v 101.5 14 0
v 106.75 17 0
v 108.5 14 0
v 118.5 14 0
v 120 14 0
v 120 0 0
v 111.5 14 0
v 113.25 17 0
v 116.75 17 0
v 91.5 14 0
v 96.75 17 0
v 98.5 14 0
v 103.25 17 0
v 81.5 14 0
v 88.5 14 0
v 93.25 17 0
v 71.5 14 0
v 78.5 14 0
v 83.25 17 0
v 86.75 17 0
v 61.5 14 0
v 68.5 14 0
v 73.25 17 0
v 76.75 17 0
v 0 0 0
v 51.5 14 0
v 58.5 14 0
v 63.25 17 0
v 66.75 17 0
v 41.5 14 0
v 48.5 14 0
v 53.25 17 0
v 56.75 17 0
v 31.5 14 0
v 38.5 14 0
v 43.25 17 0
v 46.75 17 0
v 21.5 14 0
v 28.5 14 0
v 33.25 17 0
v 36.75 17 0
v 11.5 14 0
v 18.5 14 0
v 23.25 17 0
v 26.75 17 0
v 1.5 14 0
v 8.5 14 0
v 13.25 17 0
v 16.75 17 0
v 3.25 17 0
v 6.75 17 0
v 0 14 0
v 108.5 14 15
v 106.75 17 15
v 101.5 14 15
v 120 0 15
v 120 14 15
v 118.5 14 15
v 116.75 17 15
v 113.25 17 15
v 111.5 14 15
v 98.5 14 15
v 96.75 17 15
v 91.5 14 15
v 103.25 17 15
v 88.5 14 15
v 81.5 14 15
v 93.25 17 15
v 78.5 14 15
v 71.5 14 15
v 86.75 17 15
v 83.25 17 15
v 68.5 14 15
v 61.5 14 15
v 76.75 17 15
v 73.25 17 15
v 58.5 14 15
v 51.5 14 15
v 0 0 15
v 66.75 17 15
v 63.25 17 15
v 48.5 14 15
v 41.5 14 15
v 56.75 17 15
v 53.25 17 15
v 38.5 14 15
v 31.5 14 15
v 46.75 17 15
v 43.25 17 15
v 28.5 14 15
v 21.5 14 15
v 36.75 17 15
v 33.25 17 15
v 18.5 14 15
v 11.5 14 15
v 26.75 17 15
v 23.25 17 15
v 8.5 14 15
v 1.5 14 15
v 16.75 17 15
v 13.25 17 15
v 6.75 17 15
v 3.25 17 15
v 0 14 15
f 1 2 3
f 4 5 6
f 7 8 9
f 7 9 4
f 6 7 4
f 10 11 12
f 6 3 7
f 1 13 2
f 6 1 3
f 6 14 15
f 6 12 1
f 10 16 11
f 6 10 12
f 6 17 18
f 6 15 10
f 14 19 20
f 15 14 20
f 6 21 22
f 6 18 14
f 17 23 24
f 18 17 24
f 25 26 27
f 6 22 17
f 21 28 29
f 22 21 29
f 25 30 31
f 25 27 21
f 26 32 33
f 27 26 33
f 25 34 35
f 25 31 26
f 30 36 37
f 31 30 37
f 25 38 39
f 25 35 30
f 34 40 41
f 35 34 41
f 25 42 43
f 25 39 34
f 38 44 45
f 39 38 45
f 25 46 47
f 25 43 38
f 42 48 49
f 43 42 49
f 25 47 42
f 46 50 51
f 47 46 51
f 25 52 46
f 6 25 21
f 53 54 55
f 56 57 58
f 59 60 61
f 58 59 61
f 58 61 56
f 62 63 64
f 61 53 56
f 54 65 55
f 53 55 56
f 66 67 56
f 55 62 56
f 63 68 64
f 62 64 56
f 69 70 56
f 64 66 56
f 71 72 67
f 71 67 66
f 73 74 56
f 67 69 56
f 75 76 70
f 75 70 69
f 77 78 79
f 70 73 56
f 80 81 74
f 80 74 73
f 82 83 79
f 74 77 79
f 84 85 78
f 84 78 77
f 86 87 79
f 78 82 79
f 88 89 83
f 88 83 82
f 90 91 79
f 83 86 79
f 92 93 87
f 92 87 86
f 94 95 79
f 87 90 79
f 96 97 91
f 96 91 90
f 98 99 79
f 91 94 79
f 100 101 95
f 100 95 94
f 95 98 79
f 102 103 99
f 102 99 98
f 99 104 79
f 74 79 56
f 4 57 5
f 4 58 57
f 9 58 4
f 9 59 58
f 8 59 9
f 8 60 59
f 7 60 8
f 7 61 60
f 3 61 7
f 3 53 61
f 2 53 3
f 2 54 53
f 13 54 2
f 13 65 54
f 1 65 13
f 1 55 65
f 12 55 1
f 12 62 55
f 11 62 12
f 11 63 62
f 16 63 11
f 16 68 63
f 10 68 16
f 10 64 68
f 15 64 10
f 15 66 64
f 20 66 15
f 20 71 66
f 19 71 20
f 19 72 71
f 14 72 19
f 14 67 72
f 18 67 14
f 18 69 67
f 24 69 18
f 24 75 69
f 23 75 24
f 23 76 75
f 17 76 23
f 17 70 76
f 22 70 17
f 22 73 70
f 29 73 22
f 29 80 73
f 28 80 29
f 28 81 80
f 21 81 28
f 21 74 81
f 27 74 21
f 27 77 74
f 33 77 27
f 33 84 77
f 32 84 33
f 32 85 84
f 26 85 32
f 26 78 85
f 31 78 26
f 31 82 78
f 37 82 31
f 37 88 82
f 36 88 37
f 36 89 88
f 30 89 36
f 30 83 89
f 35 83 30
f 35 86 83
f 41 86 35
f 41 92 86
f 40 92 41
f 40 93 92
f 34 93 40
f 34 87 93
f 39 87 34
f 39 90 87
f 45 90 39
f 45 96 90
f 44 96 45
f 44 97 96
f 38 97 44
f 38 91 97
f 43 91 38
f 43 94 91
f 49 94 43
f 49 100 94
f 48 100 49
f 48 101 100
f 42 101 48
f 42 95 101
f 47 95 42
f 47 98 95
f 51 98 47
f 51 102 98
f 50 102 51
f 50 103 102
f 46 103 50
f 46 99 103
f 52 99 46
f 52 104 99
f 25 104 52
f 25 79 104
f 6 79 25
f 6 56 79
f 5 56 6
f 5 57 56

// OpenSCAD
$fn = 32;

// ----------------------------------------------------------------------
// Gear rack: 12 teeth, pitch 10 mm
// ----------------------------------------------------------------------

// --- parameters (mm) ---
teeth = 12;               // number of teeth
pitch = 10;               // tooth pitch, X
root_w = 7;               // tooth width at the root
tip_w = 3.5;              // tooth width at the tip
base_h = 14;              // rack body height, Y
tooth_h = 3;              // tooth height above the body
plate_t = 15;             // rack width, Z (extrusion height)

rack_l = teeth * pitch;  // overall length
total_h = base_h + tooth_h;  // overall height

profile = [[0, 0], [120, 0], [120, 14], [118.5, 14], [116.75, 17], [113.25, 17], [111.5, 14], [108.5, 14], [106.75, 17], [103.25, 17], [101.5, 14], [98.5, 14], [96.75, 17], [93.25, 17], [91.5, 14], [88.5, 14], [86.75, 17], [83.25, 17], [81.5, 14], [78.5, 14], [76.75, 17], [73.25, 17], [71.5, 14], [68.5, 14], [66.75, 17], [63.25, 17], [61.5, 14], [58.5, 14], [56.75, 17], [53.25, 17], [51.5, 14], [48.5, 14], [46.75, 17], [43.25, 17], [41.5, 14], [38.5, 14], [36.75, 17], [33.25, 17], [31.5, 14], [28.5, 14], [26.75, 17], [23.25, 17], [21.5, 14], [18.5, 14], [16.75, 17], [13.25, 17], [11.5, 14], [8.5, 14], [6.75, 17], [3.25, 17], [1.5, 14], [0, 14]];  // primary outline, 52 points, counter clockwise

// --- the one profile operation ---
linear_extrude(height = plate_t) polygon(points = profile);
